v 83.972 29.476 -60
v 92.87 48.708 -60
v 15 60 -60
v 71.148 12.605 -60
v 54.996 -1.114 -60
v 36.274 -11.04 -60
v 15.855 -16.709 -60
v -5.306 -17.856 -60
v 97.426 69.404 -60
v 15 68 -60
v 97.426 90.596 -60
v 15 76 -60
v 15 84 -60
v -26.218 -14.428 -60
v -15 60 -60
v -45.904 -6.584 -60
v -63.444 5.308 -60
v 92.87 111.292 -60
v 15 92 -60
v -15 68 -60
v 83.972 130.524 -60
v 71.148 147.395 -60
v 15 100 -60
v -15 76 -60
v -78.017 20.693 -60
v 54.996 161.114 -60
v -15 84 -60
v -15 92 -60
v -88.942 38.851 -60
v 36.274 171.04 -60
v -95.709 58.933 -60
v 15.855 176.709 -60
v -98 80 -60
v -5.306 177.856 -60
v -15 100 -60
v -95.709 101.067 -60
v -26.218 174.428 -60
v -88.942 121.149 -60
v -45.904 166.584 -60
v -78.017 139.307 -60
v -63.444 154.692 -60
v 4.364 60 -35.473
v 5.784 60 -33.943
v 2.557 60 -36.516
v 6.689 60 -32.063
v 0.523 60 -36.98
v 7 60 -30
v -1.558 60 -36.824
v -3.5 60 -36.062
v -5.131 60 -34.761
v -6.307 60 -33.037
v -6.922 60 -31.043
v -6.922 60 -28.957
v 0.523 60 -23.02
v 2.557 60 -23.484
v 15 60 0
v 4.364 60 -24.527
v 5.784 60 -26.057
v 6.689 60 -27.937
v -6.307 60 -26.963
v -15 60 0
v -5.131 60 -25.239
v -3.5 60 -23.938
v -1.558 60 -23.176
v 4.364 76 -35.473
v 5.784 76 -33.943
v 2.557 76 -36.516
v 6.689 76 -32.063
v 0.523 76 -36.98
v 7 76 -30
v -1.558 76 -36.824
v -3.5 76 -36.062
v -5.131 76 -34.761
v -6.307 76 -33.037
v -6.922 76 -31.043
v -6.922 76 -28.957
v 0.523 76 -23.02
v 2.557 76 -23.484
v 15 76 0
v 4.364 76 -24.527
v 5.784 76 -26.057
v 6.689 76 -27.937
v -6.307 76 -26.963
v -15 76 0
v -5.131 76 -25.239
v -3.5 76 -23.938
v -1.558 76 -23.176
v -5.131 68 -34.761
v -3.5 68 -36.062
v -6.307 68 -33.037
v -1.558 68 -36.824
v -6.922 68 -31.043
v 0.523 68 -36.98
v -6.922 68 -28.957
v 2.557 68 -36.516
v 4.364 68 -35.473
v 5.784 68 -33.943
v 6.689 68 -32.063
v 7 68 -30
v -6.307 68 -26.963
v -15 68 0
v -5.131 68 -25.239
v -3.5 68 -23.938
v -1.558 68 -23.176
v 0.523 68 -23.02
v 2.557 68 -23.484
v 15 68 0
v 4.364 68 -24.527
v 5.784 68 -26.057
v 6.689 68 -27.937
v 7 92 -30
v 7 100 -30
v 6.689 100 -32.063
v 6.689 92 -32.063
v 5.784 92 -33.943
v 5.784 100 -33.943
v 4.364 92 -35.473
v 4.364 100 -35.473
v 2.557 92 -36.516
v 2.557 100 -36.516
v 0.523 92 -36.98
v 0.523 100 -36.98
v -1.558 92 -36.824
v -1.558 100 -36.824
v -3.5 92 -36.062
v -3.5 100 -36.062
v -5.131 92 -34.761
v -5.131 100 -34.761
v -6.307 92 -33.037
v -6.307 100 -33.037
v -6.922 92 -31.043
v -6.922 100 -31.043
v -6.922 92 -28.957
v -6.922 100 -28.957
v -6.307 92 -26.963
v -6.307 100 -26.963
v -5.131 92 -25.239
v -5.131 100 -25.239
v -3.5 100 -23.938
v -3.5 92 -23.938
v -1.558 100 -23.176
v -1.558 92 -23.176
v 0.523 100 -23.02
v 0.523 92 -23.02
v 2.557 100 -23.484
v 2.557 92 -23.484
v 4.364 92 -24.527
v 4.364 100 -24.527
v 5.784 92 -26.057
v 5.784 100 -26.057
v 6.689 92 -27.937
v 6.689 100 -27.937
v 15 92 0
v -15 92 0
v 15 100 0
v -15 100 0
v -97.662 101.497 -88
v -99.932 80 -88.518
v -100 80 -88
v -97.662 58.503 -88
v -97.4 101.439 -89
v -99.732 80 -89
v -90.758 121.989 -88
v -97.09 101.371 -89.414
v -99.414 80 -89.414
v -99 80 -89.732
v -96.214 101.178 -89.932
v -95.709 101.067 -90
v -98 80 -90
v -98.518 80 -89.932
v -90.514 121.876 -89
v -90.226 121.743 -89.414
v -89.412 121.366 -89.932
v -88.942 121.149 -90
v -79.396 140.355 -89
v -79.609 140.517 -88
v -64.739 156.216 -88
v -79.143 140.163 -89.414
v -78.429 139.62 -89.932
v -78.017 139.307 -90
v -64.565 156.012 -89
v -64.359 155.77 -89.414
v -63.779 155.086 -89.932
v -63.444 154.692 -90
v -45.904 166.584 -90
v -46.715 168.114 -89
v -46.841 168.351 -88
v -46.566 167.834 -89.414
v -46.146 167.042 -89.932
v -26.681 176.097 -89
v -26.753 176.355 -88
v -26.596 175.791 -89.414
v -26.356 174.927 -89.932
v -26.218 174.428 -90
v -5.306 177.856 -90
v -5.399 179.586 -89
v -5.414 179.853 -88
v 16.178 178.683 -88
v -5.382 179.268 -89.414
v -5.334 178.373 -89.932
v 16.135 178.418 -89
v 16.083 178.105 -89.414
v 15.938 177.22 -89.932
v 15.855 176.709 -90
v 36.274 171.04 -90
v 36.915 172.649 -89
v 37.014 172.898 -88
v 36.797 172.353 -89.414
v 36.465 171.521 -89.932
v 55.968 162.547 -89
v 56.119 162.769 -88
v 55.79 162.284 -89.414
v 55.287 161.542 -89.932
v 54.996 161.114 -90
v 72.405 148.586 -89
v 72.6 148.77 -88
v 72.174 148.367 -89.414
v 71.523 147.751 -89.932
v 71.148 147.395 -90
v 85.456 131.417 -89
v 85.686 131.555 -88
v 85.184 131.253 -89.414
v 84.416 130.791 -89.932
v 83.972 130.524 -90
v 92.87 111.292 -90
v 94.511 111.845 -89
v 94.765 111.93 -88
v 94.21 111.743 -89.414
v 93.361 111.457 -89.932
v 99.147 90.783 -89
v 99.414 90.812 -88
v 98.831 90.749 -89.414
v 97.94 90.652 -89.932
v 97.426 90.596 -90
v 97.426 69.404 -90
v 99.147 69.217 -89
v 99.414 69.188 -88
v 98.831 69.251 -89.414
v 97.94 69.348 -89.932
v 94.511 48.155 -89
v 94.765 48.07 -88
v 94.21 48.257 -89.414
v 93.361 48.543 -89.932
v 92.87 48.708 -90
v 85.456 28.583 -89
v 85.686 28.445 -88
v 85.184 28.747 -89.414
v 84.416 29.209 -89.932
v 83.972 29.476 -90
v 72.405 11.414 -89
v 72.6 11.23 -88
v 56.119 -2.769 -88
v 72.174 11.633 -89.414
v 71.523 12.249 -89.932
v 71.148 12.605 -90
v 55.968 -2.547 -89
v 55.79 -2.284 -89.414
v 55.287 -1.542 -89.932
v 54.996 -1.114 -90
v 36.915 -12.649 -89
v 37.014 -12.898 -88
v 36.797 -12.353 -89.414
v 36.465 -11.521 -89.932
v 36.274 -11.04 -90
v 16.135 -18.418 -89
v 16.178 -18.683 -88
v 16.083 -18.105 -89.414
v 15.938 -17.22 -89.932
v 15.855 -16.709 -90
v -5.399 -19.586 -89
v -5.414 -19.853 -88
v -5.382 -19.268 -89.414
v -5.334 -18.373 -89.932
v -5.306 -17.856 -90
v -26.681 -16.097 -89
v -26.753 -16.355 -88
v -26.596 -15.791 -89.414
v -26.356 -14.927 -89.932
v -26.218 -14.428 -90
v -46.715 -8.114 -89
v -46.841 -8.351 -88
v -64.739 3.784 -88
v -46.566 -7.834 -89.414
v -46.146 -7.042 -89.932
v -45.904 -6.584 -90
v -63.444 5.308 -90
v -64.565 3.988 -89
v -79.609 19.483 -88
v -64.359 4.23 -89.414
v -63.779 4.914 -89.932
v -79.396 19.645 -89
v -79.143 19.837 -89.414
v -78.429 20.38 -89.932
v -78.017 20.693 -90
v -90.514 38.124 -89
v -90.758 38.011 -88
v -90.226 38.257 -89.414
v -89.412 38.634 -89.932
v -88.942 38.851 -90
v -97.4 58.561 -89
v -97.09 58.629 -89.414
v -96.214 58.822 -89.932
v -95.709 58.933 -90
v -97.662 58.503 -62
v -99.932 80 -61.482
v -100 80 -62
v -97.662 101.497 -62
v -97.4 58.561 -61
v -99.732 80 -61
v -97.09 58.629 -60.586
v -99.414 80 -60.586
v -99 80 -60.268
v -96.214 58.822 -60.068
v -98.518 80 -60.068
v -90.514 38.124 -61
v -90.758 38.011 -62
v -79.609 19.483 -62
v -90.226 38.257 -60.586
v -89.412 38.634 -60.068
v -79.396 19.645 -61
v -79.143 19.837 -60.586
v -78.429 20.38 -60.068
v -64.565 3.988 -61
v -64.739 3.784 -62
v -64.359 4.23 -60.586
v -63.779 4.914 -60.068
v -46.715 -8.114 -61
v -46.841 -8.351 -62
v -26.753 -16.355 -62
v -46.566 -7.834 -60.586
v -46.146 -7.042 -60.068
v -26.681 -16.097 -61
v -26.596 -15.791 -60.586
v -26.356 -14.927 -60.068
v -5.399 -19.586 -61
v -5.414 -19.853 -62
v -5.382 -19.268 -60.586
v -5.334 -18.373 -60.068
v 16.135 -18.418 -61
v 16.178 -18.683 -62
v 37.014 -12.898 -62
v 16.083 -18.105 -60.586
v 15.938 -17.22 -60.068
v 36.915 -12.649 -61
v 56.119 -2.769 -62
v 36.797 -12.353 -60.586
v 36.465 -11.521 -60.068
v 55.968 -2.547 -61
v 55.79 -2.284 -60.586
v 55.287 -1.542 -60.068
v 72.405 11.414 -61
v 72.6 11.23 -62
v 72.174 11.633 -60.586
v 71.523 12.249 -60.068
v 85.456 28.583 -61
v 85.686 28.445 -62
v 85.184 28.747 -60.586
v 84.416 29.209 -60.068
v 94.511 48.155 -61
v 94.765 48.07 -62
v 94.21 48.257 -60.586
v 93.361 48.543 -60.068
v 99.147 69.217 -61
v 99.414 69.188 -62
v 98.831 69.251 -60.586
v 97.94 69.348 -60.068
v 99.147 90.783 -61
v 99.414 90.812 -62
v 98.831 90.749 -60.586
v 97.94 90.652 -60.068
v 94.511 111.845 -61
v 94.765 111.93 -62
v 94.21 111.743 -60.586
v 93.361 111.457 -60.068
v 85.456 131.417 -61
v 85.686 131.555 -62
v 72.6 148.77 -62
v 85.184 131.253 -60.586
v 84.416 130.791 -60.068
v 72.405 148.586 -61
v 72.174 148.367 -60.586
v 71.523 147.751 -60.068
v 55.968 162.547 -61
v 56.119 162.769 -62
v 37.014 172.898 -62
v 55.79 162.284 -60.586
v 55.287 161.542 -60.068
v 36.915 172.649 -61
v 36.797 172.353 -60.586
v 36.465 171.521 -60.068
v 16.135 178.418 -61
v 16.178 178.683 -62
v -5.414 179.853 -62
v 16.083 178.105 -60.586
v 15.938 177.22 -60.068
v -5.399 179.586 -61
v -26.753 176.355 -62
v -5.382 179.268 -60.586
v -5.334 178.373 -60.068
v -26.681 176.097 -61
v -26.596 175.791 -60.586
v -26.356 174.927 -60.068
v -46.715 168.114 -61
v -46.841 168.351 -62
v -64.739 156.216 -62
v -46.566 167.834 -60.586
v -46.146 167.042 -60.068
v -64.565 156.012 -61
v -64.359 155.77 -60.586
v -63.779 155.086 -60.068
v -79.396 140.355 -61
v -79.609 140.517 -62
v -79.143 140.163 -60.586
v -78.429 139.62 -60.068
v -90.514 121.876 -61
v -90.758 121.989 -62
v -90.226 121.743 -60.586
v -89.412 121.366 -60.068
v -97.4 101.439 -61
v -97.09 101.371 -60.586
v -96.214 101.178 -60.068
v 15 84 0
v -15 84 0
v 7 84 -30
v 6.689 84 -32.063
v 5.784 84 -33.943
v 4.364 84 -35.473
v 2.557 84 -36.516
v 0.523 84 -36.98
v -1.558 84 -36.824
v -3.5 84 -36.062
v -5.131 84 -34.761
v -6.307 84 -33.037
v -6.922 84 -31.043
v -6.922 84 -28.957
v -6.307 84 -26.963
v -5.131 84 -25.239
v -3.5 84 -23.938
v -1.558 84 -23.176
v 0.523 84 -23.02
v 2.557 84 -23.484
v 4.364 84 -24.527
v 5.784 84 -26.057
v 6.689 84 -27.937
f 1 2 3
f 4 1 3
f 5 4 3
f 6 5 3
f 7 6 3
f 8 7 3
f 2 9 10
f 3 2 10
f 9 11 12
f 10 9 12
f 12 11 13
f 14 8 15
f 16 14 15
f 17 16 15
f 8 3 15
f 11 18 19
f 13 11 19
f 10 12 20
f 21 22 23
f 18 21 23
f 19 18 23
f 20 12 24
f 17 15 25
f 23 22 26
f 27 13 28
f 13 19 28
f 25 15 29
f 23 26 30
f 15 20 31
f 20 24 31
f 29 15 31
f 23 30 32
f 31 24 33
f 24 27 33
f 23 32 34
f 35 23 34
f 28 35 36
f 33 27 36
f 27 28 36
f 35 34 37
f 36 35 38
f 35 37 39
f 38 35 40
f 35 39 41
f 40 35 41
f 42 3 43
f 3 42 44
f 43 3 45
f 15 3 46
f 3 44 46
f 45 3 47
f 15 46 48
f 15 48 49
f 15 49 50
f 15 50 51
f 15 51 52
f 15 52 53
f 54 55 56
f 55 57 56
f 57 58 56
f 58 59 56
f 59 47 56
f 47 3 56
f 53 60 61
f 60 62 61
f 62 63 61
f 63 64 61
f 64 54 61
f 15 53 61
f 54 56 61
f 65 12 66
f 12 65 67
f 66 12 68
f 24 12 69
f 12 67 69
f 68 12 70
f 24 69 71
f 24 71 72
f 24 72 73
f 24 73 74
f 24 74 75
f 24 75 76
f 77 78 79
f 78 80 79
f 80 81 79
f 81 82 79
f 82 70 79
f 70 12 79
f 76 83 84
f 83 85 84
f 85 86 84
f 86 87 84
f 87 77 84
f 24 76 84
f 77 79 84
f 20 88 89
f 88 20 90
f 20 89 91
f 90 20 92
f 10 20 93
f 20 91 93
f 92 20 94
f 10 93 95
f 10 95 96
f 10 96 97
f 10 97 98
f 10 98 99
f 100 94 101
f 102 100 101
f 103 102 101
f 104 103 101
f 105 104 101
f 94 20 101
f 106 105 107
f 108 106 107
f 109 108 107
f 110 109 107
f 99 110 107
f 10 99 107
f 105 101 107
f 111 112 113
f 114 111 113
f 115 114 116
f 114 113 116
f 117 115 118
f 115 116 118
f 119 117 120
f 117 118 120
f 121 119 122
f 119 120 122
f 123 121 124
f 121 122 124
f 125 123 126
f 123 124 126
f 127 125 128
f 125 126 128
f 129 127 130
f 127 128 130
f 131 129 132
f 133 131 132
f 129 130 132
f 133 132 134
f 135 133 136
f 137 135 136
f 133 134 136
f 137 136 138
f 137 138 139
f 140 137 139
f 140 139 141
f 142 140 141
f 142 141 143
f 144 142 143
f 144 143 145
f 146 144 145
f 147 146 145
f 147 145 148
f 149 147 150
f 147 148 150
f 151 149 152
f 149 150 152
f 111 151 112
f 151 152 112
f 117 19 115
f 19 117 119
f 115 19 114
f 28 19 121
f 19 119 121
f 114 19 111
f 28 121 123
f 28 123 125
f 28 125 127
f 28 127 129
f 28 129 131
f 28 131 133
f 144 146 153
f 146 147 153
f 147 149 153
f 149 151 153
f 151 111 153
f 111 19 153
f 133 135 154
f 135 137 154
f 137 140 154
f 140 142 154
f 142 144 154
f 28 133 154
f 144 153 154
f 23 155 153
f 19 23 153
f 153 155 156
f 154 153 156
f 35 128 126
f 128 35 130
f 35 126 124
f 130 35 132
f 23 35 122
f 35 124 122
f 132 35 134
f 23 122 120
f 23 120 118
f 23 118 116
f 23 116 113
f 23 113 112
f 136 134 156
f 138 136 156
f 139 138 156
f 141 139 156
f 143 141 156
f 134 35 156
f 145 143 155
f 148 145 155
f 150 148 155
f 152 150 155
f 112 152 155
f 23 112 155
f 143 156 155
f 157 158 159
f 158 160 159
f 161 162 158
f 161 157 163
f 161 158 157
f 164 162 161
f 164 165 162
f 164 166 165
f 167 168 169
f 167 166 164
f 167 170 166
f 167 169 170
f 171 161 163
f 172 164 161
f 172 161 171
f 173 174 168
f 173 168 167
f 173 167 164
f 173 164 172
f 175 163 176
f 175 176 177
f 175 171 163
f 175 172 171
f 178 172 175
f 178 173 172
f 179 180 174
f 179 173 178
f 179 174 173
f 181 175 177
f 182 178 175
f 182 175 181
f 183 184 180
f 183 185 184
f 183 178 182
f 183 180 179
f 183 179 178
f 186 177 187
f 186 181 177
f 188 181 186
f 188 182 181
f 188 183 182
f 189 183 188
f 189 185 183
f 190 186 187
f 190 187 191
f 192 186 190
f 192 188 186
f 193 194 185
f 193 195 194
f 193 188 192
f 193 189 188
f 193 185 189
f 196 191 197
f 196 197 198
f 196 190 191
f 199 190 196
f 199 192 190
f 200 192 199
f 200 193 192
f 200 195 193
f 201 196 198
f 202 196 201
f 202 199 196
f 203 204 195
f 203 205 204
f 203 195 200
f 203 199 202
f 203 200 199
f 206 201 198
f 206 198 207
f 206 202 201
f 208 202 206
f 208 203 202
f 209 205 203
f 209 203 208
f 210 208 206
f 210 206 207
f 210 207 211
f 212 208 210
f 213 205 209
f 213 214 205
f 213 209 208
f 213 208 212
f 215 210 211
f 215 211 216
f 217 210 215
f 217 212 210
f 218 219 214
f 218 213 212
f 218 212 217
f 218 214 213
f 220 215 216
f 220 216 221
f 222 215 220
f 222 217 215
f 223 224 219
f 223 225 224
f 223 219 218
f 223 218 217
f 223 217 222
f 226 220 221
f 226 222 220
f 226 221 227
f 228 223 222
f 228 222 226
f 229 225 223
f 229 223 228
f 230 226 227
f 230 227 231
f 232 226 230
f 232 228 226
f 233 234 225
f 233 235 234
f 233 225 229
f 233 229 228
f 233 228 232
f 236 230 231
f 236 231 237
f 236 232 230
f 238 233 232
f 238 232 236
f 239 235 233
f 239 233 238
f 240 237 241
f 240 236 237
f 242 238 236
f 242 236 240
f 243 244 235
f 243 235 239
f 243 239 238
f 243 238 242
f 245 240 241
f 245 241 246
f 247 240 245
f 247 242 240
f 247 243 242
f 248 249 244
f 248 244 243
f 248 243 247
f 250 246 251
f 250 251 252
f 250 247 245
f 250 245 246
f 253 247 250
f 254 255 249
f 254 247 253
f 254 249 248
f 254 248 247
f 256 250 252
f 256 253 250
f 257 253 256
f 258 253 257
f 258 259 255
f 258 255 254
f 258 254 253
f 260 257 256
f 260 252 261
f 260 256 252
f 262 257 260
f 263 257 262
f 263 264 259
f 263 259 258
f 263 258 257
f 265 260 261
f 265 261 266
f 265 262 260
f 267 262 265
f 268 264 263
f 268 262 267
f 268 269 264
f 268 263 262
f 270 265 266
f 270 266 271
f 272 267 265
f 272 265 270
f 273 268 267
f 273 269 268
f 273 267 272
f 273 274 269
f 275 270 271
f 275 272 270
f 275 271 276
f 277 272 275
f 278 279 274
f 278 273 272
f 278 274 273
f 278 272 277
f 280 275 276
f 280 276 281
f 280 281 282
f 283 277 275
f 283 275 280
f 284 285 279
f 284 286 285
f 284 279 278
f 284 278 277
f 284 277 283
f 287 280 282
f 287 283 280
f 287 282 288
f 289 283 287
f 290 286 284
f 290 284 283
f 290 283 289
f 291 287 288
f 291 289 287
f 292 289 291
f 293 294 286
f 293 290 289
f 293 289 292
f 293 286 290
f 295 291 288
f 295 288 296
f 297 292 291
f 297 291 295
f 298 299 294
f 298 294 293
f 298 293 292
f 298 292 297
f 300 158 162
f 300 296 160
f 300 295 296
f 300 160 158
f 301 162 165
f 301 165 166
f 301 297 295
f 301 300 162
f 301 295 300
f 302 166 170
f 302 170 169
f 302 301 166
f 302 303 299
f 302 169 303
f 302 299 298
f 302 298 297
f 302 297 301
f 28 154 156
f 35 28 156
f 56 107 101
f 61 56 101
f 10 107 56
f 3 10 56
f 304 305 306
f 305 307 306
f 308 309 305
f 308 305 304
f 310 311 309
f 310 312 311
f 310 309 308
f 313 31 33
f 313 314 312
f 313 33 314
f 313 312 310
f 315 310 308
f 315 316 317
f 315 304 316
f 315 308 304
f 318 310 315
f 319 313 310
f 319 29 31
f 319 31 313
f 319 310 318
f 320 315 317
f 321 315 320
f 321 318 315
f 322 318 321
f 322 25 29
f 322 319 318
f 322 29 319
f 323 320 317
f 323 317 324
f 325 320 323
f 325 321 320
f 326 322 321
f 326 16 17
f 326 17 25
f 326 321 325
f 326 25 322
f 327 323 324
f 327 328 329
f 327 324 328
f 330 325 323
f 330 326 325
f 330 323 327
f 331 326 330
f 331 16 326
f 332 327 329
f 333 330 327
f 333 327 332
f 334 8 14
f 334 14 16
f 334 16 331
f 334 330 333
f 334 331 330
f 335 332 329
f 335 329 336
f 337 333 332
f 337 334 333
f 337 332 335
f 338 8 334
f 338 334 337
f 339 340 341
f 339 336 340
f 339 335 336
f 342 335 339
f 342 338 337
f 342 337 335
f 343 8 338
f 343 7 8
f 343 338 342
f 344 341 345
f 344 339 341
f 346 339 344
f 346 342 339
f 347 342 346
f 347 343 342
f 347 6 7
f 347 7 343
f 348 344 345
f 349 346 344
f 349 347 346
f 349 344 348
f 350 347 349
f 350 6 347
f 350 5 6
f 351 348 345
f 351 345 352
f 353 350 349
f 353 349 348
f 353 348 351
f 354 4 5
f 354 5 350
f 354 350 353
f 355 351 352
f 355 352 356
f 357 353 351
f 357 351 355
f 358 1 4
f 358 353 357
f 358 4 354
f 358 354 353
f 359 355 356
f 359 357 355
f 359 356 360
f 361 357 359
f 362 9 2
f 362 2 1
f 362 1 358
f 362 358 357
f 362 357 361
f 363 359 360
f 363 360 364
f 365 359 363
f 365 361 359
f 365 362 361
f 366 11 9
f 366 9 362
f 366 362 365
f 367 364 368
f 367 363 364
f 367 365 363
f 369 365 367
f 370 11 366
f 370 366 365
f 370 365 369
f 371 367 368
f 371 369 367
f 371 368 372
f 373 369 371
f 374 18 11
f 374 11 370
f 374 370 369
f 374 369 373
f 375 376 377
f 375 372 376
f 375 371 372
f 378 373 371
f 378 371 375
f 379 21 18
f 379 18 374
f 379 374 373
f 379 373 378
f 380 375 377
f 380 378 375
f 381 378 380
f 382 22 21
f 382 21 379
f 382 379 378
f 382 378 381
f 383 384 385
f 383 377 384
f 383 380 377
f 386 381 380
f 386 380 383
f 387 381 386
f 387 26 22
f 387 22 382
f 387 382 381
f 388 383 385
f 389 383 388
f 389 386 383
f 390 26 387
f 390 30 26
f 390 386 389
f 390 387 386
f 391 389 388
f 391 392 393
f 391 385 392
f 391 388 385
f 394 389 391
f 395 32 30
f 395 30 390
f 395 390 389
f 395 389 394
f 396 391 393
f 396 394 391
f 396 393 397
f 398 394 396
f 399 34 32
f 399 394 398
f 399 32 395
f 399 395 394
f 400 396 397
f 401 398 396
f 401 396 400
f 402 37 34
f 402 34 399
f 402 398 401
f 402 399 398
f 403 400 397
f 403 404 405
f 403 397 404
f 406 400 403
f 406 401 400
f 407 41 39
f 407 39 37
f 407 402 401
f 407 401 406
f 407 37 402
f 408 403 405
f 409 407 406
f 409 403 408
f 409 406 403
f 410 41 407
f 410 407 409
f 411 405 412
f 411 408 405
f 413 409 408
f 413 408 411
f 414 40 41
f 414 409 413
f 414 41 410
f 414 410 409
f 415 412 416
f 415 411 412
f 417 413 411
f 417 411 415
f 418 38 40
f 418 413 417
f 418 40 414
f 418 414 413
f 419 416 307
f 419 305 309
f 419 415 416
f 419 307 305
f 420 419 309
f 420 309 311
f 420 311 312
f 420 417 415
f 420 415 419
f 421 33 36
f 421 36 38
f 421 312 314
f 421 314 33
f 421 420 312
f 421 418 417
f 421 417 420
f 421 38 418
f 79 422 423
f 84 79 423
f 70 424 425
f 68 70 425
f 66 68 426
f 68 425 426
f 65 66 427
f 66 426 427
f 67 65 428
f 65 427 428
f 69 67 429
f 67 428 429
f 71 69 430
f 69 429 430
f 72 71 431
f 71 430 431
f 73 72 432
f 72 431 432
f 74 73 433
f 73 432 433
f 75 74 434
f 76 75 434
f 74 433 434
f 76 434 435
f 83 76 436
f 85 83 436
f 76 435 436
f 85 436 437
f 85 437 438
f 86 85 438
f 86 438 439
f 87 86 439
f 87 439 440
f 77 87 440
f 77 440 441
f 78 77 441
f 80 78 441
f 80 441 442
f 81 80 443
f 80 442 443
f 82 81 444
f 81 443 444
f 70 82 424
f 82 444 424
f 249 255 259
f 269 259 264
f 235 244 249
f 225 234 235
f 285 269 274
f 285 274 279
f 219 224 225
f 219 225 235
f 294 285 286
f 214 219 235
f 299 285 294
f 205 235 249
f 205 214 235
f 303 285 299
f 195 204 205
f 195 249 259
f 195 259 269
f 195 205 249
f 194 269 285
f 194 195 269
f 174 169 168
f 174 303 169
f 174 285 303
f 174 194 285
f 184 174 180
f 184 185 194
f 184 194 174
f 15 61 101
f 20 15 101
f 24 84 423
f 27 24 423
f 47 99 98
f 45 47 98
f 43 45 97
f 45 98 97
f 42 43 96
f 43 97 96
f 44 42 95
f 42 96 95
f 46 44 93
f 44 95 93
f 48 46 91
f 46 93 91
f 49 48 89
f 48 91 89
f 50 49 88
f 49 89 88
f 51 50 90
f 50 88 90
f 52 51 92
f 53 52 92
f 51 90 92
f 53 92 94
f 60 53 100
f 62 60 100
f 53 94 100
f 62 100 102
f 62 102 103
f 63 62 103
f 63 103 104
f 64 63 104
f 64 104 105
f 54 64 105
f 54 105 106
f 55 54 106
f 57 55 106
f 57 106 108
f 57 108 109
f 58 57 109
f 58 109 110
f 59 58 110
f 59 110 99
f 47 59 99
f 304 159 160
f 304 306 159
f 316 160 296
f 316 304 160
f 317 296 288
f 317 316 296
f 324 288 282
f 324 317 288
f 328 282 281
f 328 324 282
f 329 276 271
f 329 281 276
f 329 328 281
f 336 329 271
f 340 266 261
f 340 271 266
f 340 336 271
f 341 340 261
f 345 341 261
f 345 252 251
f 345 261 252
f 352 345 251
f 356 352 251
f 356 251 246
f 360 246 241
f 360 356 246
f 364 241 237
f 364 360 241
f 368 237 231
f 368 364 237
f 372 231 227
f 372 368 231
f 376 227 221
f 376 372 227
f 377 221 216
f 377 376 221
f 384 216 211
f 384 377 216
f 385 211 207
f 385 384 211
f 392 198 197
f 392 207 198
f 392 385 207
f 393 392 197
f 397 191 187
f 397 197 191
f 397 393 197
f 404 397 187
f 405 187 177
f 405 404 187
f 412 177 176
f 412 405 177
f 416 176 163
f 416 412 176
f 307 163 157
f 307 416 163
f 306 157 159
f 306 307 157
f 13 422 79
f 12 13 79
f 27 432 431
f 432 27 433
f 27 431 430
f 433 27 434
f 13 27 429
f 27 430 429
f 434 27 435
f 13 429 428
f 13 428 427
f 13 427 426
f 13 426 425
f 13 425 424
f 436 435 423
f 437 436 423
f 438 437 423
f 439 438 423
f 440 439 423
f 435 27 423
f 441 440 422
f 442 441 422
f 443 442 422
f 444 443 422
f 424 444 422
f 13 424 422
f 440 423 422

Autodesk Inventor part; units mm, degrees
ref_plane "Arbeitsebene1" through (0, 0, 0) normal (0, 0, -1) x (-1, 0, 0)
sketch "Skizze3" plane through (0, 0, 0) normal (0, 0, -1) x (-1, 0, 0)
  point P0 (0, 0)
ref_plane "Arbeitsebene4" through (0, 0, 0) normal (0, 0, -1) x (-1, 0, 0)
sketch "Skizze4" plane through (0, 0, 0) normal (0, 0, -1) x (-1, 0, 0)
  line L0 (15, 68) -> (-15, 68)
  line L1 (-15, 68) -> (-15, 60)
  line L2 (-15, 60) -> (15, 60)
  line L3 (15, 60) -> (15, 68)
  line L4 (-15, 76) -> (15, 76)
  line L5 (15, 76) -> (15, 84)
  line L6 (15, 84) -> (-15, 84)
  line L7 (-15, 84) -> (-15, 76)
  line L8 (-15, 92) -> (15, 92)
  line L9 (15, 92) -> (15, 100)
  line L10 (15, 100) -> (-15, 100)
  line L11 (-15, 100) -> (-15, 92)
  point P0 (0, 0)
  dimension "d7" = 30
  dimension "d8" = 8
  dimension "d9" = 30
  dimension "d10" = 8
  dimension "d11" = 8
extrude "Extrusion3" add sketch "Skizze4" along normal blind 60
ref_plane "Arbeitsebene3" through (-15, 100, 0) normal (0, 1, 0) x (1, 0, 0)
sketch "Skizze5" plane through (-15, 100, 0) normal (0, 1, 0) x (1, 0, 0)
  circle A0 centre (15, 30) radius 7
  line L0 (0, 60) -> (30, 60) projected
  arc A1 (30, 60) -> (0, 60) centre (15, 60) ccw
  point P0 (15, 0)
  dimension "d14" = 14
  dimension "d15" = 15
extrude "Extrusion4" cut sketch "Skizze5" against normal blind 40 contours A0
sketch "Skizze6" plane through (0, 0, -60) normal (0, 0, -1) x (-1, 0, 0)
  circle A0 centre (0, 80) radius 100
  point P0 (0, 0)
  point P1 (-15, 76)
  dimension "d19" = 200
extrude "Extrusion5" add sketch "Skizze6" along normal blind 30
fillet "Rundung1" radius 2 2 edges at (100, 80, -90) (100, 80, -60)
properties part number "Hochfahren_nach_Stempel"
